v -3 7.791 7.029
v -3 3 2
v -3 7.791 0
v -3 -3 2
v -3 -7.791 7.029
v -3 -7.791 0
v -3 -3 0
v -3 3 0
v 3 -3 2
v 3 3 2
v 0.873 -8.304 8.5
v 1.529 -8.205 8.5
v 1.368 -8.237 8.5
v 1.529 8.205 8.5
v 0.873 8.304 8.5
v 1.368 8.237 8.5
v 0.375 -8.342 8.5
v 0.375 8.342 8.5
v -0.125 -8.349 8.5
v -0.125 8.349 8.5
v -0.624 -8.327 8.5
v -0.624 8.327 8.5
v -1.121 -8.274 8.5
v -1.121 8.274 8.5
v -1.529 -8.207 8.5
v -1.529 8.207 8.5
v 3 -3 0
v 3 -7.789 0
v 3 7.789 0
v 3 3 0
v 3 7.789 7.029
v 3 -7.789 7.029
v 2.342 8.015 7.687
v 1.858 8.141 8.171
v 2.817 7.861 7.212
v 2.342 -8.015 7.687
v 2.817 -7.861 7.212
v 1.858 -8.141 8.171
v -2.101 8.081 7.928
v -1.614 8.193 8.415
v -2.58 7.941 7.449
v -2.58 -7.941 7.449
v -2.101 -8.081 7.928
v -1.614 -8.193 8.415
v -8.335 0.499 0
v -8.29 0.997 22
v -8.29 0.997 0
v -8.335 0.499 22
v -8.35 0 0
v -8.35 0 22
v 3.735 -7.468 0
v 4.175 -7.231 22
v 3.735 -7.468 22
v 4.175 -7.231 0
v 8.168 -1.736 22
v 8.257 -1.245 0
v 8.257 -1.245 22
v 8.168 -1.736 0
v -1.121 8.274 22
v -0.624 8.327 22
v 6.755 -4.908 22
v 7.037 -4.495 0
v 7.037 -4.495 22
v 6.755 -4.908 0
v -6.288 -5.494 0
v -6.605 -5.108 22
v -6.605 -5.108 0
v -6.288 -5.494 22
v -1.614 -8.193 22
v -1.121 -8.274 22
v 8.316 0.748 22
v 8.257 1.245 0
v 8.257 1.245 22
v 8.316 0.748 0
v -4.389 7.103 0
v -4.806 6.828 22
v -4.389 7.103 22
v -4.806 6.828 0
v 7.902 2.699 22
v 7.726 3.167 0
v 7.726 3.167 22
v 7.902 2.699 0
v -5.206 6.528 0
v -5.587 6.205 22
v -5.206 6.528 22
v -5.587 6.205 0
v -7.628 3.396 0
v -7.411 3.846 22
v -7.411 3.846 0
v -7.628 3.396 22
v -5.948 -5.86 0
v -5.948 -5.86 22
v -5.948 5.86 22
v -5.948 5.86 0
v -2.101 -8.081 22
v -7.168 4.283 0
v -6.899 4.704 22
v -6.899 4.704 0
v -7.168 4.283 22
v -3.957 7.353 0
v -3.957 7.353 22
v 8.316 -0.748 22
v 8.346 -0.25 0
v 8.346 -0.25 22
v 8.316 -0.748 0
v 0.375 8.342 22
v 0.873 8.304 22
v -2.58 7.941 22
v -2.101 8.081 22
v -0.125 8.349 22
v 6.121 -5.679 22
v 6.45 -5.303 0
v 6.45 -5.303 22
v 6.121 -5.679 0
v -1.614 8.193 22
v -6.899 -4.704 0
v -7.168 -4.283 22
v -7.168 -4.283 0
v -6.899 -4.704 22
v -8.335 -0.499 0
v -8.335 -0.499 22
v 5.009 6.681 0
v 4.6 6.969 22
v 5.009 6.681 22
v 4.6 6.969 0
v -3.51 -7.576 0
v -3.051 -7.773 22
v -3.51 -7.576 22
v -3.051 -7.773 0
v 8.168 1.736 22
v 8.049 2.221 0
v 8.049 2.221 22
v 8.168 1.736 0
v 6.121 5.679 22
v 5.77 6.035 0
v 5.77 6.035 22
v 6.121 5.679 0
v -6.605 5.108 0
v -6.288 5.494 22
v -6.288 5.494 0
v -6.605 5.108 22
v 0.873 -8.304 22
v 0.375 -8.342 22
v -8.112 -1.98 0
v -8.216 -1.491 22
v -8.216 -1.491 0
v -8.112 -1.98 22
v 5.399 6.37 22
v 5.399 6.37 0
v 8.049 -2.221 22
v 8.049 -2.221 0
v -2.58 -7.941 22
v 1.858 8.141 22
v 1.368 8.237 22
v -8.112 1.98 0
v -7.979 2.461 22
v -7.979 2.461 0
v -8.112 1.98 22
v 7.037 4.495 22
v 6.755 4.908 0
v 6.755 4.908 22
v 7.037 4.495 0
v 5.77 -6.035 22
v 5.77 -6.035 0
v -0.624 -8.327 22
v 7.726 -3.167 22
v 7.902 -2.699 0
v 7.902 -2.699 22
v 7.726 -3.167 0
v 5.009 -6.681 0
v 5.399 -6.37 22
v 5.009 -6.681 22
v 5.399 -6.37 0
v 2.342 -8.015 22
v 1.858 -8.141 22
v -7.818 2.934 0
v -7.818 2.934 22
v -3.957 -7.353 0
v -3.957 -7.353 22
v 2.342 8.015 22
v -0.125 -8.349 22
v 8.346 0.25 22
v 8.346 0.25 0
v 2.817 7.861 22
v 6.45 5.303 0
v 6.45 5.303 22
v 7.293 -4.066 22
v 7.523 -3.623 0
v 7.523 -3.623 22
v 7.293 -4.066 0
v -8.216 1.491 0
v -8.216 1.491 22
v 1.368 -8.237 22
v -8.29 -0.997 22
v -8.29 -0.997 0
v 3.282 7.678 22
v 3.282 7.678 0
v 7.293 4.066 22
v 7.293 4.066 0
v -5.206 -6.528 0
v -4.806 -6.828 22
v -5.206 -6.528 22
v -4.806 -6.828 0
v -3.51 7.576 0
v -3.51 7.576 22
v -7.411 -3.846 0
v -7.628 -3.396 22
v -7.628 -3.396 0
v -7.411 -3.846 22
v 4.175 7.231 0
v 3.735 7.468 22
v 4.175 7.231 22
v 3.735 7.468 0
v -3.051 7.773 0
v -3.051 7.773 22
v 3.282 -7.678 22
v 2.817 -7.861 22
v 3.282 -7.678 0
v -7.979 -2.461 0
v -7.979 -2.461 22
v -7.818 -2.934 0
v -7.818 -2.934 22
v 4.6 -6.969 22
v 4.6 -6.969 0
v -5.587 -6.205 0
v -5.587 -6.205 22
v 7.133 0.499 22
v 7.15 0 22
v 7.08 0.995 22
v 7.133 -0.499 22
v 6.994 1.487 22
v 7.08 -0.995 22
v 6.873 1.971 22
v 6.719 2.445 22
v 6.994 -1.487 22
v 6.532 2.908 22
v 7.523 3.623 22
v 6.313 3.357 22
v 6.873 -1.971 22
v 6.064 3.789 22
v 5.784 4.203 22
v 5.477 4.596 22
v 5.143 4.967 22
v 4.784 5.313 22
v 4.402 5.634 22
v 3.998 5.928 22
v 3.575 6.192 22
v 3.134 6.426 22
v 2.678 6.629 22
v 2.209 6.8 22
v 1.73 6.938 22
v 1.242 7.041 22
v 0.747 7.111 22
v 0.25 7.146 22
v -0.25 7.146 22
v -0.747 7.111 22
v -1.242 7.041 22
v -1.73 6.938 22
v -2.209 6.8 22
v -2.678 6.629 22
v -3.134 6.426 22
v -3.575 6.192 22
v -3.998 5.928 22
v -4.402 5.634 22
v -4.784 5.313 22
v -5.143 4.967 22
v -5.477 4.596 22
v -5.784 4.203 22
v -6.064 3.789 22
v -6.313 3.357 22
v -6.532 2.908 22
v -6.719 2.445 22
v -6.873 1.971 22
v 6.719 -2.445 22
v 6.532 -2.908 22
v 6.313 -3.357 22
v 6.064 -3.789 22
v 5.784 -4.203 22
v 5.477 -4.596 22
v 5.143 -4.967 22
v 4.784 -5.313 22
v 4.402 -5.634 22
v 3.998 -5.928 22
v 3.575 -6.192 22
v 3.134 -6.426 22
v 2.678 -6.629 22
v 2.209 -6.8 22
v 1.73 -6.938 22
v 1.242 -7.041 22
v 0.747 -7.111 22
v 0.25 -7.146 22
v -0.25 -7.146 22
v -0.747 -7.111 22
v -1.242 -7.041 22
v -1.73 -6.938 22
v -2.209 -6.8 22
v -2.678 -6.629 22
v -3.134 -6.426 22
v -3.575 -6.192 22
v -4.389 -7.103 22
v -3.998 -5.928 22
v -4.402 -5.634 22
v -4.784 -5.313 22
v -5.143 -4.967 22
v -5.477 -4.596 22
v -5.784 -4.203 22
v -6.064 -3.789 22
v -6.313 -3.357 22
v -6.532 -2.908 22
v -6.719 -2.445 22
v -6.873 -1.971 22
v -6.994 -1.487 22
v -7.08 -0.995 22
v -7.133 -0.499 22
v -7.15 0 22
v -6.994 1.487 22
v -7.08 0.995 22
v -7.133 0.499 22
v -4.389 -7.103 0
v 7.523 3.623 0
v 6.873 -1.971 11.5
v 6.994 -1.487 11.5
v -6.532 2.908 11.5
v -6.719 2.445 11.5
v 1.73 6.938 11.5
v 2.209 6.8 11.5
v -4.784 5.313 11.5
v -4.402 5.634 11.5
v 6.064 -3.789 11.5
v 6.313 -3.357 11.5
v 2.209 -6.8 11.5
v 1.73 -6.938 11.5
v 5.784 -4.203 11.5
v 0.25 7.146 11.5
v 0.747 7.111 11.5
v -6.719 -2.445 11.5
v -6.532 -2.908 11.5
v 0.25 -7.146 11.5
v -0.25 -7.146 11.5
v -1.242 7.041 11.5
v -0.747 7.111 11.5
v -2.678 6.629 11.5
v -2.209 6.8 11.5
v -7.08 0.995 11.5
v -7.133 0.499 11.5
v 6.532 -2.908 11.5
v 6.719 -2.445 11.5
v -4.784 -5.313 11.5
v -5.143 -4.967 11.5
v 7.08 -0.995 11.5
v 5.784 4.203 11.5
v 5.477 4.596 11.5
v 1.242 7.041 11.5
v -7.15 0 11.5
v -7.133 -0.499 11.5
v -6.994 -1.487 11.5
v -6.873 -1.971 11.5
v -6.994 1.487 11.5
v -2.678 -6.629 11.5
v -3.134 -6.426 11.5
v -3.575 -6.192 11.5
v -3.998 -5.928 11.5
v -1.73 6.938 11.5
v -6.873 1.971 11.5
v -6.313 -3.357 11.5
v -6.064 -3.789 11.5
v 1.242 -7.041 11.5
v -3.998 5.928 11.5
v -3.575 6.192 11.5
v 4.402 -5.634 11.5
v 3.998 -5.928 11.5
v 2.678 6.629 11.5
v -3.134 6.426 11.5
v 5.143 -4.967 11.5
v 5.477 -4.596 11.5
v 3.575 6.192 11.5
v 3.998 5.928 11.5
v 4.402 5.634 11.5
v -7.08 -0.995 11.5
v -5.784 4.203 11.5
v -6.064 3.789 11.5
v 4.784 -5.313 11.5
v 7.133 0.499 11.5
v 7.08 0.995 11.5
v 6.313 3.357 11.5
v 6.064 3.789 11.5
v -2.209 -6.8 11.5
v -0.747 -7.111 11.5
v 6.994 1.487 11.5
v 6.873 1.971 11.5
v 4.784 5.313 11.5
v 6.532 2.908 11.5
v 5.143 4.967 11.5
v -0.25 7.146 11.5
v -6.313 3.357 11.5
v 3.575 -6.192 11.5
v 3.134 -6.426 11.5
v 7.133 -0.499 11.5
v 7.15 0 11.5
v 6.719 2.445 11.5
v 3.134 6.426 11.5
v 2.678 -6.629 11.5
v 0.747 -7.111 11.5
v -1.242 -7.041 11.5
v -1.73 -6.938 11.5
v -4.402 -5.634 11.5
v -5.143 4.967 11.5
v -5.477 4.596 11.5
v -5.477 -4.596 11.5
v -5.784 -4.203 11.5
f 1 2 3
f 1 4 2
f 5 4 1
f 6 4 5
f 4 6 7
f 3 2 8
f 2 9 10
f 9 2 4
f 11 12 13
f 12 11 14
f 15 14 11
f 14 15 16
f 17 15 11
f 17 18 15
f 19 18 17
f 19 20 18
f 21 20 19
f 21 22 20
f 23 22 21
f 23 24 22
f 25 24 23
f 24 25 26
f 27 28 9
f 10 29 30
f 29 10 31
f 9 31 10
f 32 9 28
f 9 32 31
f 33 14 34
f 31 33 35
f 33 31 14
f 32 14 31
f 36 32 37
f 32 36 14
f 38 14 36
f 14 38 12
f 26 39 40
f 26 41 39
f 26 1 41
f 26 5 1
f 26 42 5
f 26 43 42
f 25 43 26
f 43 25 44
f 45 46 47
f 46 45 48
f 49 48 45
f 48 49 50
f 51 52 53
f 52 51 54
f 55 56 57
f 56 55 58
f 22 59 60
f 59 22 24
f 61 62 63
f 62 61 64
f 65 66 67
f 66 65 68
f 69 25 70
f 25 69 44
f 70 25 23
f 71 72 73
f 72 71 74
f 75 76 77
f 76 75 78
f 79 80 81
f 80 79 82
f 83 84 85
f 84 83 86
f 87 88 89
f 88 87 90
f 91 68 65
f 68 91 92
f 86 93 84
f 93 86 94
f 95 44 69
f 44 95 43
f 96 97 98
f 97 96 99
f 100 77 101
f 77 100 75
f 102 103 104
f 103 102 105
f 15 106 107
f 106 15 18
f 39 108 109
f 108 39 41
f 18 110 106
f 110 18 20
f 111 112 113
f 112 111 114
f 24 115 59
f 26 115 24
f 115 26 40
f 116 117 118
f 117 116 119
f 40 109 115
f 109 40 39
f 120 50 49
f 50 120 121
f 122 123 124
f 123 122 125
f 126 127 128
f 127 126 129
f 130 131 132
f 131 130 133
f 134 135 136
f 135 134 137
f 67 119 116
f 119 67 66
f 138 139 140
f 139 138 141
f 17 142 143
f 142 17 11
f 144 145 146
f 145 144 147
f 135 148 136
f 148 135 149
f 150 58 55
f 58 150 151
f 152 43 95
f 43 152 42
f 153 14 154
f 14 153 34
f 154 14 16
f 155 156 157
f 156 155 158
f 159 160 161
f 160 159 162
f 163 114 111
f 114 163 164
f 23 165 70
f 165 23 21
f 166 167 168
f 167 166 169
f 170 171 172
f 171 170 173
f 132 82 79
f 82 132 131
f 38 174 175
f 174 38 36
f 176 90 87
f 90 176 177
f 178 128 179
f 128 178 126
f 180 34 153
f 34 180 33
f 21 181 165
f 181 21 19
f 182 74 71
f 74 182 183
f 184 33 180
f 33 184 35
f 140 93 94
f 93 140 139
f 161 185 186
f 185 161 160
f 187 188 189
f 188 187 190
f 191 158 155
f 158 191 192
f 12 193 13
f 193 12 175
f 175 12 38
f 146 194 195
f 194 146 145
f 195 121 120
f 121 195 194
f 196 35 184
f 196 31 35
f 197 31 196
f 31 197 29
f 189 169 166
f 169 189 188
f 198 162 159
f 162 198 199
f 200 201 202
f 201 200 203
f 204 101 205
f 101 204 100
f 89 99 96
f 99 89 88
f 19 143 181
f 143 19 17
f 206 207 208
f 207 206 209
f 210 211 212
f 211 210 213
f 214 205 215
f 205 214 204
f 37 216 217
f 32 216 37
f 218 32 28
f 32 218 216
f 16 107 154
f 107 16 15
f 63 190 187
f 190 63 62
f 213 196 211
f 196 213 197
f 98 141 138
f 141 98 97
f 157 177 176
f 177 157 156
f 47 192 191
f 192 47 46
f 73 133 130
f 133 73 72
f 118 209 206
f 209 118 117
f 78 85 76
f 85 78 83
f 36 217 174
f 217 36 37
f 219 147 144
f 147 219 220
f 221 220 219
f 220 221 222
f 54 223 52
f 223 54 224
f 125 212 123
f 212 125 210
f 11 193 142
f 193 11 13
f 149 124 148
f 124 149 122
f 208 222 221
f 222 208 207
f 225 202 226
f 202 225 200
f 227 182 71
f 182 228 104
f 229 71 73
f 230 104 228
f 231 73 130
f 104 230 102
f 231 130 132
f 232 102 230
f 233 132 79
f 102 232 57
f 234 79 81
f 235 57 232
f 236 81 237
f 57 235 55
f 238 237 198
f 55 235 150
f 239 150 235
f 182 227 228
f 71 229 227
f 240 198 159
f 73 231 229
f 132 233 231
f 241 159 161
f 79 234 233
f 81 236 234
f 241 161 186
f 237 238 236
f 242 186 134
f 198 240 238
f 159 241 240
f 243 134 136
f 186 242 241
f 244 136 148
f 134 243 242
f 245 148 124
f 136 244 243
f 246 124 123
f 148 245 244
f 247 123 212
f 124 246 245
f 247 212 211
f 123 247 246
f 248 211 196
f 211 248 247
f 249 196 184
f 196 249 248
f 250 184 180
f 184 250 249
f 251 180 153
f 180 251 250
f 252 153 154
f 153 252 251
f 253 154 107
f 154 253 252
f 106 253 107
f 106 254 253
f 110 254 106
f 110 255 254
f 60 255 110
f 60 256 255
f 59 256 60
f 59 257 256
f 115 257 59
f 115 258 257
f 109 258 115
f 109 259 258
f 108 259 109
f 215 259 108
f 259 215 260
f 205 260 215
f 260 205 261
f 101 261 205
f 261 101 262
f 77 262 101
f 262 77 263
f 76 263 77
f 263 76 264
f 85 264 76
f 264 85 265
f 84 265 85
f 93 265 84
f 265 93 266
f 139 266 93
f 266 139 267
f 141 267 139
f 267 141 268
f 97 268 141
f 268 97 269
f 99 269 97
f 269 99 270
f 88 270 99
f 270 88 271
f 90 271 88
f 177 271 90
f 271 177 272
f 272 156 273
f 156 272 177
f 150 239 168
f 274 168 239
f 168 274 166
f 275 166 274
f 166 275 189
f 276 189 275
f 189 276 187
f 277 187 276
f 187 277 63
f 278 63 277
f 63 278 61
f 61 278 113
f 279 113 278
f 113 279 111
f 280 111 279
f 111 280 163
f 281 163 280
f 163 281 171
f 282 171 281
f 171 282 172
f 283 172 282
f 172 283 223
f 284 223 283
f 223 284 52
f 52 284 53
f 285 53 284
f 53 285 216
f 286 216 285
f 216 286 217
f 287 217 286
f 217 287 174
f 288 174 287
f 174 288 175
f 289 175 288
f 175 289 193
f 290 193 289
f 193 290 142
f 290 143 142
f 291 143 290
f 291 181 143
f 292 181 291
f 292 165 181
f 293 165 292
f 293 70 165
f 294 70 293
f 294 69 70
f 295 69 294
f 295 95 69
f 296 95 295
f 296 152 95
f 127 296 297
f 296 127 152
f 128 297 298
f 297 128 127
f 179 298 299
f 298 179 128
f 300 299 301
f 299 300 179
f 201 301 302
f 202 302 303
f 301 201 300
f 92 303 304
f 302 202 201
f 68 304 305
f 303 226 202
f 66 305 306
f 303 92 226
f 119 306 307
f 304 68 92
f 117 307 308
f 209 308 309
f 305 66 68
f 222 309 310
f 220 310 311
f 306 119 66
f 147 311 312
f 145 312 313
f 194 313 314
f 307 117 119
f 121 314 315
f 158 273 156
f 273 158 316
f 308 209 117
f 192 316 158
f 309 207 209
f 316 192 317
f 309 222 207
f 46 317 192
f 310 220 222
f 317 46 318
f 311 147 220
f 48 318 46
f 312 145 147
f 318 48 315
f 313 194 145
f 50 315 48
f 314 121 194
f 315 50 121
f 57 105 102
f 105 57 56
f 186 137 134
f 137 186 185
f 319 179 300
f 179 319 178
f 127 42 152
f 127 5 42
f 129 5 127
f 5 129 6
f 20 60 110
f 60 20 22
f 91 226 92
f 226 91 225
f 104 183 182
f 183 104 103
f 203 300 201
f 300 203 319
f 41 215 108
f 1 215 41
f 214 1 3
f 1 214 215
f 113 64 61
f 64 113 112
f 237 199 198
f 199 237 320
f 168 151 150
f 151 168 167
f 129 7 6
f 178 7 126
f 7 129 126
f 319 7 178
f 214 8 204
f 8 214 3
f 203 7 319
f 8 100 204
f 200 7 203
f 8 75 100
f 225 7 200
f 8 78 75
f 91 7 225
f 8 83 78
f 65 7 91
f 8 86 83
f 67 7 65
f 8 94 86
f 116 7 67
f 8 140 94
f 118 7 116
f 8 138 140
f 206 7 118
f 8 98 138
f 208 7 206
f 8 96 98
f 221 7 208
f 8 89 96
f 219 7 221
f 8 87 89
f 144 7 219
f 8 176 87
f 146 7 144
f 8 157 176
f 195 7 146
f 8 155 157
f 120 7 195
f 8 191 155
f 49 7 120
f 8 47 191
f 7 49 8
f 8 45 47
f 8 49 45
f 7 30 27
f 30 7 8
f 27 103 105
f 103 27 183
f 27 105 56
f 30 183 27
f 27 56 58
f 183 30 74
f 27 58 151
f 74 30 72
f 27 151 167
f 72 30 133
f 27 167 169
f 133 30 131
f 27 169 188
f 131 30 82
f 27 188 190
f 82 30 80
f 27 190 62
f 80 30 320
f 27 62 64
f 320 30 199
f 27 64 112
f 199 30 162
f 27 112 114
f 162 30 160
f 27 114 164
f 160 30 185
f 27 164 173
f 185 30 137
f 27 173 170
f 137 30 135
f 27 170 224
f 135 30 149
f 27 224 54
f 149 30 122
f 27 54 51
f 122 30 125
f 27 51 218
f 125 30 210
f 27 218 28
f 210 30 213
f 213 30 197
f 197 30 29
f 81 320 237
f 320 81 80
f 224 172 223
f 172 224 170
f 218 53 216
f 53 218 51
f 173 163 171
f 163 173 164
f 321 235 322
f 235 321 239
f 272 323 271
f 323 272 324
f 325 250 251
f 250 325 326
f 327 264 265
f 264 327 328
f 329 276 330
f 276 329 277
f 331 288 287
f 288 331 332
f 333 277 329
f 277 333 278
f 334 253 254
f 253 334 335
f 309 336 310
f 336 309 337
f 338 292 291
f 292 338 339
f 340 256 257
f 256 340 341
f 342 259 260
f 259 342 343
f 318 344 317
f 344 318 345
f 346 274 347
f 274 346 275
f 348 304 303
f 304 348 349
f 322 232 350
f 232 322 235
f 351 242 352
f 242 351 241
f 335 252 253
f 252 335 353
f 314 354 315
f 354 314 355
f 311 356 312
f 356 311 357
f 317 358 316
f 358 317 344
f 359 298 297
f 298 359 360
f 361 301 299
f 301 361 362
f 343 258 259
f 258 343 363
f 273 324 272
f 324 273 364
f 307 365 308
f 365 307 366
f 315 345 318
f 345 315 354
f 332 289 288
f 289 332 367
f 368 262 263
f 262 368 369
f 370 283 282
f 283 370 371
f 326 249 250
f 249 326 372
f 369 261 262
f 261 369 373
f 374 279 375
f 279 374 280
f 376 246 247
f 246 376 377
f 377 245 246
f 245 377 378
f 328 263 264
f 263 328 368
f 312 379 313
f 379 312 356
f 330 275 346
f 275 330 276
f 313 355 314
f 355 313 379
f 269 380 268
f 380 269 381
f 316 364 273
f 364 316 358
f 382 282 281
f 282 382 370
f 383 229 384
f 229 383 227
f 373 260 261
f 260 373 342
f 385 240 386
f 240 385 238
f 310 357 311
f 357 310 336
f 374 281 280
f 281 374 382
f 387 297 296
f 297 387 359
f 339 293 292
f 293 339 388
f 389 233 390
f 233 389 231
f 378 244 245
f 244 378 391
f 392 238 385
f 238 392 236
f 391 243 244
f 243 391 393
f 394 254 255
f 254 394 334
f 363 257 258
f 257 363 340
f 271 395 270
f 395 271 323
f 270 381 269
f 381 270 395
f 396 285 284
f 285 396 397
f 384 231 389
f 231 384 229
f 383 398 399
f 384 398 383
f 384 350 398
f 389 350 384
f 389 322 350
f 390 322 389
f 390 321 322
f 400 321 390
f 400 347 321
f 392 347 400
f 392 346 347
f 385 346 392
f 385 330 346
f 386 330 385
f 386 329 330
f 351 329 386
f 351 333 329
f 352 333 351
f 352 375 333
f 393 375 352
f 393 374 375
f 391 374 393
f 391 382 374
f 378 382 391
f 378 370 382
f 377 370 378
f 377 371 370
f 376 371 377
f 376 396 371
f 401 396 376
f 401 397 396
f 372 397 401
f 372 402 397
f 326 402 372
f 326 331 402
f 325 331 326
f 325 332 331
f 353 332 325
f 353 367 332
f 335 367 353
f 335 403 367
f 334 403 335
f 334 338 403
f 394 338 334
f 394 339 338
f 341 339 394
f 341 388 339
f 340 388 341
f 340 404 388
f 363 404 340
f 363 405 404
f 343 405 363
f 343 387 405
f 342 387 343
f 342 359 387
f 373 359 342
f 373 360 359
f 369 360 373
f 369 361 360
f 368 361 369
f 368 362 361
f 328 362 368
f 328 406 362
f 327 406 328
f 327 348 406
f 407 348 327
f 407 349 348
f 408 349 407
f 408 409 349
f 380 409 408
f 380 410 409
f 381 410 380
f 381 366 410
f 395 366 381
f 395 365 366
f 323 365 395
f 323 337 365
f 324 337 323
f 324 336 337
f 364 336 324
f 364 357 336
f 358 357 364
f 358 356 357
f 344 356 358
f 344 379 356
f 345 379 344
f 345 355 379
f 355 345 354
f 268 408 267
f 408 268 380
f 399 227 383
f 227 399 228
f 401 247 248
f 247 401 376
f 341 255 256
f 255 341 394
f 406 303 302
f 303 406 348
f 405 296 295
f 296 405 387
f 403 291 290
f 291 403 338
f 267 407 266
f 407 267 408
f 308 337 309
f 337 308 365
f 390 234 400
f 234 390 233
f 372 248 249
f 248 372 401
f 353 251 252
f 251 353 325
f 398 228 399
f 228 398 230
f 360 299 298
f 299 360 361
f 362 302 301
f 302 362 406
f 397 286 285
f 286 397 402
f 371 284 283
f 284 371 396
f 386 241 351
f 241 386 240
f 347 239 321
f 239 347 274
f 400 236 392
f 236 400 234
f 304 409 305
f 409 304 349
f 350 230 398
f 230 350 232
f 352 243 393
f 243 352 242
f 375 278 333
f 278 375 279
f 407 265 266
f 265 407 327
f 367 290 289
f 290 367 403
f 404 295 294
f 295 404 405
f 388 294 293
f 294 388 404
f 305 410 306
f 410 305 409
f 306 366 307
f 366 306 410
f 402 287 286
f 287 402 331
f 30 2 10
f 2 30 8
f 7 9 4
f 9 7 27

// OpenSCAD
$fa=0.5; // default minimum facet angle
$fs=0.5; // default minimum facet size

inner_d = 14.3;
thickness = 1.2;

inner_depth = 10.5;
cap_top_h = 3;
clip_hole = 6.5;
clip_top = 2;
clip_opening = 6;

total_h = inner_depth + cap_top_h + clip_hole + clip_top;
external_d = inner_d + 2 * thickness;

translate([0, 0, total_h])
rotate([0, 180, 0])
difference() {
    cylinder(d = external_d, h = total_h);
    translate([0, 0, -1]) cylinder(d=inner_d, h=inner_depth + 1);

    translate([0, 0, clip_hole/2+inner_depth+cap_top_h]) 
    difference() {
        cube([clip_opening, external_d+2, clip_hole], center=true);
        translate([-clip_opening *3/4, 0, -clip_hole * 3 / 4]) rotate([0, 45, 0]) cube([clip_opening, external_d+4, clip_hole], center=true);
        translate([clip_opening * 3 / 4, 0, -clip_hole * 3 / 4]) rotate([0, -45, 0]) cube([clip_opening, external_d+4, clip_hole], center=true);
    }
    
    translate([-clip_opening/2, clip_opening/2, clip_hole/2+inner_depth+cap_top_h]) cube([clip_opening, external_d, total_h]);
    translate([-clip_opening/2, -external_d-clip_opening/2, clip_hole/2+inner_depth+cap_top_h]) cube([clip_opening, external_d, total_h]);
}
